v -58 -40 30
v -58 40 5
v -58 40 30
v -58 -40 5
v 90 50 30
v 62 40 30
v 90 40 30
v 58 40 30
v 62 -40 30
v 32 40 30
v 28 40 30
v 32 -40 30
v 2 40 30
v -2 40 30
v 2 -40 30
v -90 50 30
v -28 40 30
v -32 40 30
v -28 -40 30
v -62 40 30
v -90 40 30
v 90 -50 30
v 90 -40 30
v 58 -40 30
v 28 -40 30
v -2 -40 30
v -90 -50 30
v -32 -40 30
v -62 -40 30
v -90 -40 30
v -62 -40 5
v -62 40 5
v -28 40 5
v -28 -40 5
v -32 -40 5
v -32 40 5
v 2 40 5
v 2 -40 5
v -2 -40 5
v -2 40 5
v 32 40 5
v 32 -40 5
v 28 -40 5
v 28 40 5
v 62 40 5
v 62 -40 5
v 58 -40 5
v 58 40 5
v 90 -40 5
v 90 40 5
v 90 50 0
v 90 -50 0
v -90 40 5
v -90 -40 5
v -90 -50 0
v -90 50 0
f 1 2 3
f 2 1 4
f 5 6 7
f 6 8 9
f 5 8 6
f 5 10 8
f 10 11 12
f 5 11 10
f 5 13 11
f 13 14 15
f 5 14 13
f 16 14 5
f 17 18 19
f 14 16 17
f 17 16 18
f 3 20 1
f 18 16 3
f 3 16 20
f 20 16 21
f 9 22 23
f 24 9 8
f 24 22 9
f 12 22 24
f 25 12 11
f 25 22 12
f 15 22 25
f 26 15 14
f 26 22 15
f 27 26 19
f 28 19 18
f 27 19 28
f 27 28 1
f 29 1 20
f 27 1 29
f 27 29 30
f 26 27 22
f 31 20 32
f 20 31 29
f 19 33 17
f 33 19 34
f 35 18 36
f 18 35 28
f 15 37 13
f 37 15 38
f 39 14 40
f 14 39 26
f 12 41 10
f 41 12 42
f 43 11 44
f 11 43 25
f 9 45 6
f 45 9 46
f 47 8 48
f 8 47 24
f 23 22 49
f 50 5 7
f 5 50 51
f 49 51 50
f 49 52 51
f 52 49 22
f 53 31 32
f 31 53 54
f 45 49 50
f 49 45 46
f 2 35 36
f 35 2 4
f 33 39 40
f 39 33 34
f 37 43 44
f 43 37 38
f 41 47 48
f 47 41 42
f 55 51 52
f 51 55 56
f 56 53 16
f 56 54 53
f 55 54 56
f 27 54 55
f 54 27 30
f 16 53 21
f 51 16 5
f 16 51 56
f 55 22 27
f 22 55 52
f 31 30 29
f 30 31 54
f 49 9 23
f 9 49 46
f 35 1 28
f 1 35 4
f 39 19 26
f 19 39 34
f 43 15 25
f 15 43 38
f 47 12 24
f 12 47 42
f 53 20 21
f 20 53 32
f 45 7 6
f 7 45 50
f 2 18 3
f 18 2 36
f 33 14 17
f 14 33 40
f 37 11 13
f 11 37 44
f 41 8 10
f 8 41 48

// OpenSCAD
$fn = 32;

// ----------------------------------------------------------------------
// Rib frame 180 x 100 x 30
// 5 ribs at 30 mm pitch
// ----------------------------------------------------------------------

// --- parameters (mm) ---
frame = [180, 100, 5];  // base plate size (x, y, z)
rail_w = 10;            // side rail width
ribs = 5;               // number of ribs
rib_t = 4;              // rib thickness
rib_h = 25;             // rib height above the base plate
pitch = 30;             // pitch between rib centres

// --- derived feature positions (mm) ---
span = (ribs - 1) * pitch;          // = 120   distance between the outer ribs
origin_x = -span / 2;               // = -60   X of the first rib
rib_len = frame[1] - 2 * rail_w + 2;  // = 82   rib length, 1 mm into each rail
feature_centers = [
  [origin_x + 0 * pitch, 0],
  [origin_x + 1 * pitch, 0],
  [origin_x + 2 * pitch, 0],
  [origin_x + 3 * pitch, 0],
  [origin_x + 4 * pitch, 0]
];   // rib centre line, drives the rib loop

// base plate, two side rails, then the ribs read straight off feature_centers
union() {
  translate([-frame[0] / 2, -frame[1] / 2, 0]) cube(frame);
  translate([-frame[0] / 2, -frame[1] / 2, 0]) cube([frame[0], rail_w, frame[2] + rib_h]);
  translate([-frame[0] / 2, frame[1] / 2 - rail_w, 0]) cube([frame[0], rail_w, frame[2] + rib_h]);
  for (centre = feature_centers)
    translate([centre[0] - rib_t / 2, centre[1] - rib_len / 2, frame[2] - 1])
      cube([rib_t, rib_len, rib_h + 1]);
}
